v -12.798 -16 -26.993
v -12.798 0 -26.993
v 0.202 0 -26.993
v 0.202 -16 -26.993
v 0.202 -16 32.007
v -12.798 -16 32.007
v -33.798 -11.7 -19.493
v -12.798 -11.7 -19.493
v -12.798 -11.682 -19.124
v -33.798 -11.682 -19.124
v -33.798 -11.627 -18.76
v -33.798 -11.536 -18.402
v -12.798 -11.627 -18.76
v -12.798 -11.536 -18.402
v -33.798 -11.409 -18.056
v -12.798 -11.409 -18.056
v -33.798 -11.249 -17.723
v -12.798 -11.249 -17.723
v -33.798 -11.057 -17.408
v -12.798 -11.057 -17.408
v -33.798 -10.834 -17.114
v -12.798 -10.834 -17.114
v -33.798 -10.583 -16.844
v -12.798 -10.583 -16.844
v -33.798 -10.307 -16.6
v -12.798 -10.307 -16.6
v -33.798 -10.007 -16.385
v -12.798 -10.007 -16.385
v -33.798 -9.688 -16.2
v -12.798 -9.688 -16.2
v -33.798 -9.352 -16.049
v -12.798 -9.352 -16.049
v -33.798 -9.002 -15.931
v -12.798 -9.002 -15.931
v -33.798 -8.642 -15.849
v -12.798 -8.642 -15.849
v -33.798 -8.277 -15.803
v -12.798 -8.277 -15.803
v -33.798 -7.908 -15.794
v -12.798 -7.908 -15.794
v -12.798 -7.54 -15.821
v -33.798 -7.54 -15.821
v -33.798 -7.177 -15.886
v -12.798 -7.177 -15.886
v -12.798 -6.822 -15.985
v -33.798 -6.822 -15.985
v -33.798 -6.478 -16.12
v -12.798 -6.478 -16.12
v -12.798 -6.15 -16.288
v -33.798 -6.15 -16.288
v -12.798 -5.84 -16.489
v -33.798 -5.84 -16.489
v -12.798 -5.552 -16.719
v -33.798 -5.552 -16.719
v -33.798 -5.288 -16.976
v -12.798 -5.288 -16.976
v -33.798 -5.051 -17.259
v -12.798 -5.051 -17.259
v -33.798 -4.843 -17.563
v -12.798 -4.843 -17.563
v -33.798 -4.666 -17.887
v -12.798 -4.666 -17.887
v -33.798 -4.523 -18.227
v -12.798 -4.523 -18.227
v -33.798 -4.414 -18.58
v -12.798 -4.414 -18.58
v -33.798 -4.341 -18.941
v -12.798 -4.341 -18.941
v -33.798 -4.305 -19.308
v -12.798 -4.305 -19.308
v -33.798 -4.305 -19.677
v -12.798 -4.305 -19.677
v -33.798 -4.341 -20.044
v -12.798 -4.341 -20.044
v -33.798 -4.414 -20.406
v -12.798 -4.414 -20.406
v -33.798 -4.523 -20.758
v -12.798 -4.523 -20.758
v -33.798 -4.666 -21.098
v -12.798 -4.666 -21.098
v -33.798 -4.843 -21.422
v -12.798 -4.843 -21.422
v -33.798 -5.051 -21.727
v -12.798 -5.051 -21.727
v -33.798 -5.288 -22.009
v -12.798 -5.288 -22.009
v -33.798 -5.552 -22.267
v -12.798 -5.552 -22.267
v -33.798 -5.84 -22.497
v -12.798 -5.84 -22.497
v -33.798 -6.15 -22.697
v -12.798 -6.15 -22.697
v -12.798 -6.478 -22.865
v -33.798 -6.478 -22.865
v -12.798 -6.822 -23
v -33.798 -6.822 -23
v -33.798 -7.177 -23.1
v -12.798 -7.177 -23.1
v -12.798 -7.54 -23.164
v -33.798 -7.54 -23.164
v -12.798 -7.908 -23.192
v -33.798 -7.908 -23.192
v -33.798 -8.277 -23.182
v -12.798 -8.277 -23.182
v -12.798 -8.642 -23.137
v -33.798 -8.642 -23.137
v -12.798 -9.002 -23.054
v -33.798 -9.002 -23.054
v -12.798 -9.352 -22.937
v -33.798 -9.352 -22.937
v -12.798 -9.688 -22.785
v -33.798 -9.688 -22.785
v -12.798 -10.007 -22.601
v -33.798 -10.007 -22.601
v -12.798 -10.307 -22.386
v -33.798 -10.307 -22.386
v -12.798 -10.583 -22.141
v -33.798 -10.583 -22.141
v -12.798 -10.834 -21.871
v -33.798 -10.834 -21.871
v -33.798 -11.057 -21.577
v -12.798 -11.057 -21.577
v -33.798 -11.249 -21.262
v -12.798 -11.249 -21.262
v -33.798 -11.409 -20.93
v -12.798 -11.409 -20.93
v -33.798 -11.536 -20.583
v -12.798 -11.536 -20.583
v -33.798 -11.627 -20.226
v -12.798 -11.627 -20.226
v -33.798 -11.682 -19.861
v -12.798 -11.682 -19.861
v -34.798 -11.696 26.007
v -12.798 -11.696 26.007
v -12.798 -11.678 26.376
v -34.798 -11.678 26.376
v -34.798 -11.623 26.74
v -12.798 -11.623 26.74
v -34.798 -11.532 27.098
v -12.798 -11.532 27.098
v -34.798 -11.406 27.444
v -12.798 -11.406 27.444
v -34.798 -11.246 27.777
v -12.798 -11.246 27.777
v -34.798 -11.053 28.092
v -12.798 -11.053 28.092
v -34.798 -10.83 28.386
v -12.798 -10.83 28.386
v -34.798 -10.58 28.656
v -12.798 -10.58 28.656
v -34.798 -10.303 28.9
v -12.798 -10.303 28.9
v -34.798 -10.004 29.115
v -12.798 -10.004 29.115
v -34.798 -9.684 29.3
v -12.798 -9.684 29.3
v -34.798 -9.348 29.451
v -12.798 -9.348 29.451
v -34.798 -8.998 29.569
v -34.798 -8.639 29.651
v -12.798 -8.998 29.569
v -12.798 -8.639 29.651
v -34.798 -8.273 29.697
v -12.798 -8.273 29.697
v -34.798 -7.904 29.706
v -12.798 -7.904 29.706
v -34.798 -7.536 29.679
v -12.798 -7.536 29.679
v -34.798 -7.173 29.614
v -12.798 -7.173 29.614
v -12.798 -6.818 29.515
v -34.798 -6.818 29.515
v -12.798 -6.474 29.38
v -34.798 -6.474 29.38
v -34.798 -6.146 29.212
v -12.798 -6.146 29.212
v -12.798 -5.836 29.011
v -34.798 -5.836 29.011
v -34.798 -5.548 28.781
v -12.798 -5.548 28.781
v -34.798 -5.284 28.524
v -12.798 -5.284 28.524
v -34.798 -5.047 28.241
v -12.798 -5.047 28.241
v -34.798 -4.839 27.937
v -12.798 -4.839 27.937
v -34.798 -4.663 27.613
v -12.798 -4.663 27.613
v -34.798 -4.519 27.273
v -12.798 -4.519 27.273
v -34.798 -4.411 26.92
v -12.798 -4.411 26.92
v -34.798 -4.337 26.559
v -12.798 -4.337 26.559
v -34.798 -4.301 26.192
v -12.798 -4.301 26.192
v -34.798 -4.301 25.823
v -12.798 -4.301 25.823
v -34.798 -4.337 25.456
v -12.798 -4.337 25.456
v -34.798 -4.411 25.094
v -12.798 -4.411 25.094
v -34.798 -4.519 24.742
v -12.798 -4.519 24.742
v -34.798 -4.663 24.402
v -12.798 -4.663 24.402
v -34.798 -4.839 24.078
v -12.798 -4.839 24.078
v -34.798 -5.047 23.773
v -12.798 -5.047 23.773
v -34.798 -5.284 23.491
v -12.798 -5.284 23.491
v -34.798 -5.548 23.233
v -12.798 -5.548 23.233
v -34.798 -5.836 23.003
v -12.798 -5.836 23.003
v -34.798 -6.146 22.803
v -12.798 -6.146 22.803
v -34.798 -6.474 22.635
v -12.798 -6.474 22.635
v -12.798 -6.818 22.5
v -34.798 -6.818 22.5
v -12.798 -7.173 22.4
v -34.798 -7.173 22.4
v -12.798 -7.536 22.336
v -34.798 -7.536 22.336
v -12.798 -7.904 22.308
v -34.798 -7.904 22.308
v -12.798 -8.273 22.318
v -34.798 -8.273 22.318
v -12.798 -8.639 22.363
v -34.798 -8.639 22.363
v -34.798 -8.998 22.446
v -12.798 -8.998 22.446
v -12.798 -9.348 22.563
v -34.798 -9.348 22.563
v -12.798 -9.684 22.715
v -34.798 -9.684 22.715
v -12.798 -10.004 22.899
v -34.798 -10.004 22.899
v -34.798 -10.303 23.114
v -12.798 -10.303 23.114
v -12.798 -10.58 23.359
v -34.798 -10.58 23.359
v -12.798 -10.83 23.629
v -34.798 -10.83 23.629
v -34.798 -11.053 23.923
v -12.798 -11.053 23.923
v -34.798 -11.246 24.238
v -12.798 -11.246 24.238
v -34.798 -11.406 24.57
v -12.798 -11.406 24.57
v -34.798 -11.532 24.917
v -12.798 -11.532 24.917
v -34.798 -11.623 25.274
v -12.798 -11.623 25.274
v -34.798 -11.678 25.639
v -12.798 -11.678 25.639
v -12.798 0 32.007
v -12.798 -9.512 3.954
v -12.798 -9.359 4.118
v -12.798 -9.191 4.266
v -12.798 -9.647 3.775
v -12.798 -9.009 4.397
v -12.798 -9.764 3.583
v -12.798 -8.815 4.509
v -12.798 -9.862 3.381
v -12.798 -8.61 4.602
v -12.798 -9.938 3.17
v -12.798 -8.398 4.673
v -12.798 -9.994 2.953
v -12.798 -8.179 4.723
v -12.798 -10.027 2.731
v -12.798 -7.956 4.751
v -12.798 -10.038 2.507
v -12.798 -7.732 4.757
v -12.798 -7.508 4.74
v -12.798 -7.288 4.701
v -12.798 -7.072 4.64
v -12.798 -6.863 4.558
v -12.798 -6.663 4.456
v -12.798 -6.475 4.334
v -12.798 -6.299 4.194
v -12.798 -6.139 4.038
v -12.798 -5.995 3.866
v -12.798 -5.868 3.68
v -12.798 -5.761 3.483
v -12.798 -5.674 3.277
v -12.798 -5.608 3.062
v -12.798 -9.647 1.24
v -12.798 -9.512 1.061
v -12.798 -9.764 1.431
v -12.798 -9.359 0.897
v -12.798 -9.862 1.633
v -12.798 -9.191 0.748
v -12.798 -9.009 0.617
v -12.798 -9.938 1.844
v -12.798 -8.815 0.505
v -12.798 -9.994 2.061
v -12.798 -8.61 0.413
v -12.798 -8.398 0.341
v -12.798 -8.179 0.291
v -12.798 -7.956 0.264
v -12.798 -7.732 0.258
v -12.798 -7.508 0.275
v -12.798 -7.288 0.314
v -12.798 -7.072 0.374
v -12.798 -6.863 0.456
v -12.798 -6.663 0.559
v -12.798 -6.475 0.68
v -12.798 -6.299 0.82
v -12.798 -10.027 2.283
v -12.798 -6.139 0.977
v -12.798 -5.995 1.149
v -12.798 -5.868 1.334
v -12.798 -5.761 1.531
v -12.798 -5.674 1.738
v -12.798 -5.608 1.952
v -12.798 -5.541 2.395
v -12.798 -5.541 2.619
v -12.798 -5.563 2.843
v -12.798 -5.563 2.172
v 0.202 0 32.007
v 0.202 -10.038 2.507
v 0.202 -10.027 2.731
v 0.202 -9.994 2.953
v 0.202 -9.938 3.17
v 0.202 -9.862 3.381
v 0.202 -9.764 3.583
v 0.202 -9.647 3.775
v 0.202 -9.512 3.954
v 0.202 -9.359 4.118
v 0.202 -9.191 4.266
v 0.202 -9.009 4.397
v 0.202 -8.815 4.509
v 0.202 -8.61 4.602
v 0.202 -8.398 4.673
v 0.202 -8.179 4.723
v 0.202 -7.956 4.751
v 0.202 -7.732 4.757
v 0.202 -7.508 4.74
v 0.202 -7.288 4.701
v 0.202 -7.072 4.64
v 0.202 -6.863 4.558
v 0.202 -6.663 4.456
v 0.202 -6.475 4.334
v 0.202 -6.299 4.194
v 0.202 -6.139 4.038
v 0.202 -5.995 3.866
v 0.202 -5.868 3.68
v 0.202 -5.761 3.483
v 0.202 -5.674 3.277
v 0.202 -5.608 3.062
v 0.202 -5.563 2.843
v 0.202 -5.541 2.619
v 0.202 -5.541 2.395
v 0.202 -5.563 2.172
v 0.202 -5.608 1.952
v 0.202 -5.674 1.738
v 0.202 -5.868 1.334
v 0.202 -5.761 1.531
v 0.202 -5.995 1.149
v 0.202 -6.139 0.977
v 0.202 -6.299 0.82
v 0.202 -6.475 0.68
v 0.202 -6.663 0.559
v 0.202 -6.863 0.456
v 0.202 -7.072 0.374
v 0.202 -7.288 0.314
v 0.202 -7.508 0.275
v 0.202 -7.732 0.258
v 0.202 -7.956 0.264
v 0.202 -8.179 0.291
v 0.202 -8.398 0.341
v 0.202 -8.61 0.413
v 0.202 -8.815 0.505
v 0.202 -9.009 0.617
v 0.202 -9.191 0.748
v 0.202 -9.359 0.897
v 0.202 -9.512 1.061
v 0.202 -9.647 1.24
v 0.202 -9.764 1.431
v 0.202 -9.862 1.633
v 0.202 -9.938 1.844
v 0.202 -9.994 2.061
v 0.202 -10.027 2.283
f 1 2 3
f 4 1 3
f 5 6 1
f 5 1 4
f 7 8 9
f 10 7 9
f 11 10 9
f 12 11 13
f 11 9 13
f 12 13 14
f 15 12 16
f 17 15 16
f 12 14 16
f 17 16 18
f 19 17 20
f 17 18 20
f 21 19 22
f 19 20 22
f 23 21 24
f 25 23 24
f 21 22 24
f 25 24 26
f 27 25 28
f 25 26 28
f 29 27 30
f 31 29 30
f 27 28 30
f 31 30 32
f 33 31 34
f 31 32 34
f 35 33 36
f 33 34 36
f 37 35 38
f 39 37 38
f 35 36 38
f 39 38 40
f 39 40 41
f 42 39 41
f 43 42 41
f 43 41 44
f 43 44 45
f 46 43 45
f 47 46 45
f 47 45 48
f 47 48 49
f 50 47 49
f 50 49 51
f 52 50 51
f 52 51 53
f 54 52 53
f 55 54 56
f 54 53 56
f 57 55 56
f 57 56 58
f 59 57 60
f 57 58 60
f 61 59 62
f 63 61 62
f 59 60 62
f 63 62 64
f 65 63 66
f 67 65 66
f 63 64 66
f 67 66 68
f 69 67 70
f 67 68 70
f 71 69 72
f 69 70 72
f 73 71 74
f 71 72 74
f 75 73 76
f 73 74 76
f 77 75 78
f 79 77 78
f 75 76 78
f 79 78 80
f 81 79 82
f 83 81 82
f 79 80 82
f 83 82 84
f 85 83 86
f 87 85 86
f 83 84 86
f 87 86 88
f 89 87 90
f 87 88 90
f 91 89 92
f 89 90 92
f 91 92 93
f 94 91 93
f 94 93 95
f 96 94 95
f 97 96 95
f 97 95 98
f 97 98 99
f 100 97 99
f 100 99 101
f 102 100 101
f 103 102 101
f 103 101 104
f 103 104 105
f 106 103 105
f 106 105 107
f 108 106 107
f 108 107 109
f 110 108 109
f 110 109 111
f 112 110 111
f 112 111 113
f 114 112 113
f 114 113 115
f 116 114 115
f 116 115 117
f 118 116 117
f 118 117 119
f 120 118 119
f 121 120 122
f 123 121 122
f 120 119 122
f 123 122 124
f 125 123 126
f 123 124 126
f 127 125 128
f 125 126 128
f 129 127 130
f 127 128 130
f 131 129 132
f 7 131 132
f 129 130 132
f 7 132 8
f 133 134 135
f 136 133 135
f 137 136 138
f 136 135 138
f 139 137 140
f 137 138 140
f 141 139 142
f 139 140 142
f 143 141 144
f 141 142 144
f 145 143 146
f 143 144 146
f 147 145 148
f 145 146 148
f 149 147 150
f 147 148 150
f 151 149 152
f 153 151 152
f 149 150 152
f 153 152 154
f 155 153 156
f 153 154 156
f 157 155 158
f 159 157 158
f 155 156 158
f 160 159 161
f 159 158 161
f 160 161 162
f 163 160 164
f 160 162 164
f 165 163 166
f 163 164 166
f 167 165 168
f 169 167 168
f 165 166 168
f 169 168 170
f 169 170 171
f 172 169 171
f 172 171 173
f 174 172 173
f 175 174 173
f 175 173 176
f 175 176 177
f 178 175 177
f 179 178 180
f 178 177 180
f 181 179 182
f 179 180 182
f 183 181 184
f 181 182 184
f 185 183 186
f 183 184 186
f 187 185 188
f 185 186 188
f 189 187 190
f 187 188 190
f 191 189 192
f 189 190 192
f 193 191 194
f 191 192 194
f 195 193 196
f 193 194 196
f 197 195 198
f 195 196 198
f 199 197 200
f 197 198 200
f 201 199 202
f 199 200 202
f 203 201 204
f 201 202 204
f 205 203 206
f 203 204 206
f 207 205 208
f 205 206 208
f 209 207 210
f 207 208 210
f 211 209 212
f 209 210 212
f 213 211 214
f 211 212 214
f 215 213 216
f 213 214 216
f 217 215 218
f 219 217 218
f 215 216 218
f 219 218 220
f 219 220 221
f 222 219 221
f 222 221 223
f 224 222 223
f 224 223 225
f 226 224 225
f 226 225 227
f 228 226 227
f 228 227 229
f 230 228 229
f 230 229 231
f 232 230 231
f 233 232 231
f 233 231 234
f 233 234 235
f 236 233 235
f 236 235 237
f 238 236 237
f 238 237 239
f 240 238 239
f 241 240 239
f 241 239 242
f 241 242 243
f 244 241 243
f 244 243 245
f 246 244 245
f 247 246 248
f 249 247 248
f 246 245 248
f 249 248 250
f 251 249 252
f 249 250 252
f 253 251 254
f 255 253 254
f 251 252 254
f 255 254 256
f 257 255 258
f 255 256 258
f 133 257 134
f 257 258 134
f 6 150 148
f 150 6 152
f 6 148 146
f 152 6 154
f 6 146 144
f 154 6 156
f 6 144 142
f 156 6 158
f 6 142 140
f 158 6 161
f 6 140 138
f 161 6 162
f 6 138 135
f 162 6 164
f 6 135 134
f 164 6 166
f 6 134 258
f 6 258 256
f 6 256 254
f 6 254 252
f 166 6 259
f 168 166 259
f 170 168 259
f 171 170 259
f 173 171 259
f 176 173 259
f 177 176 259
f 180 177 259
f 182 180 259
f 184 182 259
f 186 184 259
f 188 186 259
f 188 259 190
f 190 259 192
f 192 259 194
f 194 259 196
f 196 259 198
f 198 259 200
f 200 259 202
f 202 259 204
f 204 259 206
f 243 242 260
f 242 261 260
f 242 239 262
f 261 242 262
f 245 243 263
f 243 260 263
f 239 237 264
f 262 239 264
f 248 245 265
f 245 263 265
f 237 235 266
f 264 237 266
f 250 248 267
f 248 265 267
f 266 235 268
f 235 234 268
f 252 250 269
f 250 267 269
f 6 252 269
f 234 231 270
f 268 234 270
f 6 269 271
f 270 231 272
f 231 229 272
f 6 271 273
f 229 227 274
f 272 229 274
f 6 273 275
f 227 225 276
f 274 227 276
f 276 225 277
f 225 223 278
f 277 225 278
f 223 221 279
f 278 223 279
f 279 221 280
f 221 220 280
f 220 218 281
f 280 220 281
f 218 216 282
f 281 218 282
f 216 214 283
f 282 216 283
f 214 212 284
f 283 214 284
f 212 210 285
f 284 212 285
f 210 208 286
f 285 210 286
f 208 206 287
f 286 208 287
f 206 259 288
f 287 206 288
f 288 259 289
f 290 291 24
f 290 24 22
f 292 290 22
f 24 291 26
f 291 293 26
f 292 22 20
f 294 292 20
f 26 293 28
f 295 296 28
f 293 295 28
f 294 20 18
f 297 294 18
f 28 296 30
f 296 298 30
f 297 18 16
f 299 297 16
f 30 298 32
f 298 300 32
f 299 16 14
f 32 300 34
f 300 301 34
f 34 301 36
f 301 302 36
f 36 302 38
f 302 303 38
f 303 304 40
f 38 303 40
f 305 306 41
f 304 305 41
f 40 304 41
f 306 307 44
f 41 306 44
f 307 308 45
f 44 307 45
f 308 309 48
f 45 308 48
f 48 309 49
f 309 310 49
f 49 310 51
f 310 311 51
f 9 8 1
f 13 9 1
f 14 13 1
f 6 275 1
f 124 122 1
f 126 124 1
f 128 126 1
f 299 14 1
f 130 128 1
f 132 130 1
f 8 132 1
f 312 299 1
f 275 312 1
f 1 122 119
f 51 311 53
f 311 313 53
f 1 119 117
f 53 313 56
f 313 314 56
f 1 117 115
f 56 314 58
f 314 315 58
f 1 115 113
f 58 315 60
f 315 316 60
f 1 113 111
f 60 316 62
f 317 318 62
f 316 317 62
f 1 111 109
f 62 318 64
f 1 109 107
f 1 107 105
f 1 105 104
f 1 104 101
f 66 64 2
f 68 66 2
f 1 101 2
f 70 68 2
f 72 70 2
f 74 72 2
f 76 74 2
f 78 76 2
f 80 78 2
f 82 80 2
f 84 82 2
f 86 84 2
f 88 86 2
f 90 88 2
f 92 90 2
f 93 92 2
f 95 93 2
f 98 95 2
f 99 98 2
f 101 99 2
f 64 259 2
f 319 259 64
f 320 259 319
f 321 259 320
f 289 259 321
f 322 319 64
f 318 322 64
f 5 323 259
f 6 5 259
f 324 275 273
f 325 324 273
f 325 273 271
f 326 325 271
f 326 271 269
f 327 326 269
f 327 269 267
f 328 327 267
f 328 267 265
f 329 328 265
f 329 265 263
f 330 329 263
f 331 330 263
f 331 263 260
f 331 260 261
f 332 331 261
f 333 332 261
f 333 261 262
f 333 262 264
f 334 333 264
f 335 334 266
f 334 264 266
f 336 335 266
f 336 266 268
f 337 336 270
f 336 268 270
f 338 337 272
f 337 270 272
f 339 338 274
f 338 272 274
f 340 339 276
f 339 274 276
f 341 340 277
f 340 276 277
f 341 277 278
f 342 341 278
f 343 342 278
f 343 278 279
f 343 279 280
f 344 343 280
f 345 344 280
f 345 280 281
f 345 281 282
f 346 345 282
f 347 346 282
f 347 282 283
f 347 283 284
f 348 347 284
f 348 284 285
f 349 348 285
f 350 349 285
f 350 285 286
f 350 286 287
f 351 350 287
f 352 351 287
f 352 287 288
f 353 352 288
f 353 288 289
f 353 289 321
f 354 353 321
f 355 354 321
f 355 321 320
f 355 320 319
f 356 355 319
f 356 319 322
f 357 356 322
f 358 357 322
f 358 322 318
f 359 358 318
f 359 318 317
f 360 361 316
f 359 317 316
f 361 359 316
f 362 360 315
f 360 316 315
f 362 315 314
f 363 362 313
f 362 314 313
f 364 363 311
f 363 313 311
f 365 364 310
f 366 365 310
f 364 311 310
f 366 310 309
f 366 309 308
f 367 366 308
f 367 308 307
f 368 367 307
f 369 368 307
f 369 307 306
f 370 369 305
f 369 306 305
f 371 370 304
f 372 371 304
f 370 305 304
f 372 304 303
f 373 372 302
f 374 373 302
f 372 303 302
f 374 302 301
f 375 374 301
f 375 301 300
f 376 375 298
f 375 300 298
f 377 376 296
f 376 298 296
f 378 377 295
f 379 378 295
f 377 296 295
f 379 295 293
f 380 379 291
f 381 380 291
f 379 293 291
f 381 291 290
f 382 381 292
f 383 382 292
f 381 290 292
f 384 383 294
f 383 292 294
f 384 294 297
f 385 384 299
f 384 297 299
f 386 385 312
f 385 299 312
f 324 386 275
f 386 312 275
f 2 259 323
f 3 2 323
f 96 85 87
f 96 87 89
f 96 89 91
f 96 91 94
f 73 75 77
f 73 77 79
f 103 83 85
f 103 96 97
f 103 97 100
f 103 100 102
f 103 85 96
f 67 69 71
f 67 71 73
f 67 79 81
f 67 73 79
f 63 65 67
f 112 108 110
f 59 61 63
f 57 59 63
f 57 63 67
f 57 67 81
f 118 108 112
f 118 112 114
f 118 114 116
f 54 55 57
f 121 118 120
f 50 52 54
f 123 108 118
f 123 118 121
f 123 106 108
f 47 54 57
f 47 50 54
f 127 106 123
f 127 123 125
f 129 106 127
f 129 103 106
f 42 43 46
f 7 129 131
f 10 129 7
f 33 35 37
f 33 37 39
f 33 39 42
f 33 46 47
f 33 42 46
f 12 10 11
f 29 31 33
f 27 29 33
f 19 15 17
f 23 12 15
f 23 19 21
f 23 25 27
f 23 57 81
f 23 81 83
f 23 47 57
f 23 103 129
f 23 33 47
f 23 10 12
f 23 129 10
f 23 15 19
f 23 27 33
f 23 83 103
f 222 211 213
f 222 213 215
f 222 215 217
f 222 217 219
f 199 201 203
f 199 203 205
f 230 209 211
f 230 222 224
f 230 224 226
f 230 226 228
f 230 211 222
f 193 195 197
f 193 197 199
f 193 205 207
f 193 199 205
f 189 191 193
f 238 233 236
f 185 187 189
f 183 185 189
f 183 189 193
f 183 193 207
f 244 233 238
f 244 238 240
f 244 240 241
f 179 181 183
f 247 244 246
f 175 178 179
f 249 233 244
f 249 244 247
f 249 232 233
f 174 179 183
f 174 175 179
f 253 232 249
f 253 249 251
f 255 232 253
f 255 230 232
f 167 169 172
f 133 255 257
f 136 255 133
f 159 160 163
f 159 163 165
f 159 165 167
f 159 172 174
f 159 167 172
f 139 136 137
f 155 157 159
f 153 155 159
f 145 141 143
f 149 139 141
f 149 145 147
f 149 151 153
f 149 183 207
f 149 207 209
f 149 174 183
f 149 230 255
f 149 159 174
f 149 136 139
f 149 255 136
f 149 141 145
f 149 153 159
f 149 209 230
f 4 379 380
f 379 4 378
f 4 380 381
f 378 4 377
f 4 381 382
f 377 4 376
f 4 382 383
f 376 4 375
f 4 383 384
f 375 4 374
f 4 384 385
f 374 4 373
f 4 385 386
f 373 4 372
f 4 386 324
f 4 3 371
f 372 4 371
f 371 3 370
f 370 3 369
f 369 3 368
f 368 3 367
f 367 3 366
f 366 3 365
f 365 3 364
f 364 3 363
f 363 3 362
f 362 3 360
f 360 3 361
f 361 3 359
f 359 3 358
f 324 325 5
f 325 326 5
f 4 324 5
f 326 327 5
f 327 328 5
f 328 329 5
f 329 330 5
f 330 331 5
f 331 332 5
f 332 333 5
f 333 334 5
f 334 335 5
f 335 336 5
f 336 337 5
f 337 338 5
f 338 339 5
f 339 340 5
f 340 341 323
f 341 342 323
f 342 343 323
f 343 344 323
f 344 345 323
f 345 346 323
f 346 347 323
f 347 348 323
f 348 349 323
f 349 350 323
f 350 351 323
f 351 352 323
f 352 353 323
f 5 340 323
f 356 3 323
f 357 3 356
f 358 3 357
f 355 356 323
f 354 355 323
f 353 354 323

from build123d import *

# Parameters (mm, degrees)
F1_DEPTH = 16
F2_R     = 3.7
F3_DEPTH = 22
F4_DEPTH = 21
F6_D     = 4.5


with BuildPart() as f1:
    # F0 (on Front) → F1 (new body)
    with BuildSketch(Plane.XZ):
        Polygon((0.202192, 32.007239), (-12.797808, 32.007239), (-12.797808, 19.507239), (-12.797808, -8.492761), (-12.797808, -26.992761), (0.202192, -26.992761), align=None)
    extrude(amount=F1_DEPTH)

    # F2 (on face) → F3 (join)
    with BuildSketch(Plane(origin=(-12.797808, 0, 0), x_dir=(0, -1, 0), z_dir=(-1, 0, 0))):
        with Locations((7.996093, 26.00724)):
            Circle(F2_R)
    extrude(amount=F3_DEPTH)

    # F2 (on face) → F4 (join)
    with BuildSketch(Plane(origin=(-12.797808, 0, 0), x_dir=(0, -1, 0), z_dir=(-1, 0, 0))):
        with Locations((8, -19.492761)):
            Circle(F2_R)
    extrude(amount=F4_DEPTH)

    # F6 (through all)
    with Locations(Plane.YZ.offset(0.202192)):
        with Locations((-7.788272, 2.507239)):
            Hole(F6_D / 2)


solid = f1.part
